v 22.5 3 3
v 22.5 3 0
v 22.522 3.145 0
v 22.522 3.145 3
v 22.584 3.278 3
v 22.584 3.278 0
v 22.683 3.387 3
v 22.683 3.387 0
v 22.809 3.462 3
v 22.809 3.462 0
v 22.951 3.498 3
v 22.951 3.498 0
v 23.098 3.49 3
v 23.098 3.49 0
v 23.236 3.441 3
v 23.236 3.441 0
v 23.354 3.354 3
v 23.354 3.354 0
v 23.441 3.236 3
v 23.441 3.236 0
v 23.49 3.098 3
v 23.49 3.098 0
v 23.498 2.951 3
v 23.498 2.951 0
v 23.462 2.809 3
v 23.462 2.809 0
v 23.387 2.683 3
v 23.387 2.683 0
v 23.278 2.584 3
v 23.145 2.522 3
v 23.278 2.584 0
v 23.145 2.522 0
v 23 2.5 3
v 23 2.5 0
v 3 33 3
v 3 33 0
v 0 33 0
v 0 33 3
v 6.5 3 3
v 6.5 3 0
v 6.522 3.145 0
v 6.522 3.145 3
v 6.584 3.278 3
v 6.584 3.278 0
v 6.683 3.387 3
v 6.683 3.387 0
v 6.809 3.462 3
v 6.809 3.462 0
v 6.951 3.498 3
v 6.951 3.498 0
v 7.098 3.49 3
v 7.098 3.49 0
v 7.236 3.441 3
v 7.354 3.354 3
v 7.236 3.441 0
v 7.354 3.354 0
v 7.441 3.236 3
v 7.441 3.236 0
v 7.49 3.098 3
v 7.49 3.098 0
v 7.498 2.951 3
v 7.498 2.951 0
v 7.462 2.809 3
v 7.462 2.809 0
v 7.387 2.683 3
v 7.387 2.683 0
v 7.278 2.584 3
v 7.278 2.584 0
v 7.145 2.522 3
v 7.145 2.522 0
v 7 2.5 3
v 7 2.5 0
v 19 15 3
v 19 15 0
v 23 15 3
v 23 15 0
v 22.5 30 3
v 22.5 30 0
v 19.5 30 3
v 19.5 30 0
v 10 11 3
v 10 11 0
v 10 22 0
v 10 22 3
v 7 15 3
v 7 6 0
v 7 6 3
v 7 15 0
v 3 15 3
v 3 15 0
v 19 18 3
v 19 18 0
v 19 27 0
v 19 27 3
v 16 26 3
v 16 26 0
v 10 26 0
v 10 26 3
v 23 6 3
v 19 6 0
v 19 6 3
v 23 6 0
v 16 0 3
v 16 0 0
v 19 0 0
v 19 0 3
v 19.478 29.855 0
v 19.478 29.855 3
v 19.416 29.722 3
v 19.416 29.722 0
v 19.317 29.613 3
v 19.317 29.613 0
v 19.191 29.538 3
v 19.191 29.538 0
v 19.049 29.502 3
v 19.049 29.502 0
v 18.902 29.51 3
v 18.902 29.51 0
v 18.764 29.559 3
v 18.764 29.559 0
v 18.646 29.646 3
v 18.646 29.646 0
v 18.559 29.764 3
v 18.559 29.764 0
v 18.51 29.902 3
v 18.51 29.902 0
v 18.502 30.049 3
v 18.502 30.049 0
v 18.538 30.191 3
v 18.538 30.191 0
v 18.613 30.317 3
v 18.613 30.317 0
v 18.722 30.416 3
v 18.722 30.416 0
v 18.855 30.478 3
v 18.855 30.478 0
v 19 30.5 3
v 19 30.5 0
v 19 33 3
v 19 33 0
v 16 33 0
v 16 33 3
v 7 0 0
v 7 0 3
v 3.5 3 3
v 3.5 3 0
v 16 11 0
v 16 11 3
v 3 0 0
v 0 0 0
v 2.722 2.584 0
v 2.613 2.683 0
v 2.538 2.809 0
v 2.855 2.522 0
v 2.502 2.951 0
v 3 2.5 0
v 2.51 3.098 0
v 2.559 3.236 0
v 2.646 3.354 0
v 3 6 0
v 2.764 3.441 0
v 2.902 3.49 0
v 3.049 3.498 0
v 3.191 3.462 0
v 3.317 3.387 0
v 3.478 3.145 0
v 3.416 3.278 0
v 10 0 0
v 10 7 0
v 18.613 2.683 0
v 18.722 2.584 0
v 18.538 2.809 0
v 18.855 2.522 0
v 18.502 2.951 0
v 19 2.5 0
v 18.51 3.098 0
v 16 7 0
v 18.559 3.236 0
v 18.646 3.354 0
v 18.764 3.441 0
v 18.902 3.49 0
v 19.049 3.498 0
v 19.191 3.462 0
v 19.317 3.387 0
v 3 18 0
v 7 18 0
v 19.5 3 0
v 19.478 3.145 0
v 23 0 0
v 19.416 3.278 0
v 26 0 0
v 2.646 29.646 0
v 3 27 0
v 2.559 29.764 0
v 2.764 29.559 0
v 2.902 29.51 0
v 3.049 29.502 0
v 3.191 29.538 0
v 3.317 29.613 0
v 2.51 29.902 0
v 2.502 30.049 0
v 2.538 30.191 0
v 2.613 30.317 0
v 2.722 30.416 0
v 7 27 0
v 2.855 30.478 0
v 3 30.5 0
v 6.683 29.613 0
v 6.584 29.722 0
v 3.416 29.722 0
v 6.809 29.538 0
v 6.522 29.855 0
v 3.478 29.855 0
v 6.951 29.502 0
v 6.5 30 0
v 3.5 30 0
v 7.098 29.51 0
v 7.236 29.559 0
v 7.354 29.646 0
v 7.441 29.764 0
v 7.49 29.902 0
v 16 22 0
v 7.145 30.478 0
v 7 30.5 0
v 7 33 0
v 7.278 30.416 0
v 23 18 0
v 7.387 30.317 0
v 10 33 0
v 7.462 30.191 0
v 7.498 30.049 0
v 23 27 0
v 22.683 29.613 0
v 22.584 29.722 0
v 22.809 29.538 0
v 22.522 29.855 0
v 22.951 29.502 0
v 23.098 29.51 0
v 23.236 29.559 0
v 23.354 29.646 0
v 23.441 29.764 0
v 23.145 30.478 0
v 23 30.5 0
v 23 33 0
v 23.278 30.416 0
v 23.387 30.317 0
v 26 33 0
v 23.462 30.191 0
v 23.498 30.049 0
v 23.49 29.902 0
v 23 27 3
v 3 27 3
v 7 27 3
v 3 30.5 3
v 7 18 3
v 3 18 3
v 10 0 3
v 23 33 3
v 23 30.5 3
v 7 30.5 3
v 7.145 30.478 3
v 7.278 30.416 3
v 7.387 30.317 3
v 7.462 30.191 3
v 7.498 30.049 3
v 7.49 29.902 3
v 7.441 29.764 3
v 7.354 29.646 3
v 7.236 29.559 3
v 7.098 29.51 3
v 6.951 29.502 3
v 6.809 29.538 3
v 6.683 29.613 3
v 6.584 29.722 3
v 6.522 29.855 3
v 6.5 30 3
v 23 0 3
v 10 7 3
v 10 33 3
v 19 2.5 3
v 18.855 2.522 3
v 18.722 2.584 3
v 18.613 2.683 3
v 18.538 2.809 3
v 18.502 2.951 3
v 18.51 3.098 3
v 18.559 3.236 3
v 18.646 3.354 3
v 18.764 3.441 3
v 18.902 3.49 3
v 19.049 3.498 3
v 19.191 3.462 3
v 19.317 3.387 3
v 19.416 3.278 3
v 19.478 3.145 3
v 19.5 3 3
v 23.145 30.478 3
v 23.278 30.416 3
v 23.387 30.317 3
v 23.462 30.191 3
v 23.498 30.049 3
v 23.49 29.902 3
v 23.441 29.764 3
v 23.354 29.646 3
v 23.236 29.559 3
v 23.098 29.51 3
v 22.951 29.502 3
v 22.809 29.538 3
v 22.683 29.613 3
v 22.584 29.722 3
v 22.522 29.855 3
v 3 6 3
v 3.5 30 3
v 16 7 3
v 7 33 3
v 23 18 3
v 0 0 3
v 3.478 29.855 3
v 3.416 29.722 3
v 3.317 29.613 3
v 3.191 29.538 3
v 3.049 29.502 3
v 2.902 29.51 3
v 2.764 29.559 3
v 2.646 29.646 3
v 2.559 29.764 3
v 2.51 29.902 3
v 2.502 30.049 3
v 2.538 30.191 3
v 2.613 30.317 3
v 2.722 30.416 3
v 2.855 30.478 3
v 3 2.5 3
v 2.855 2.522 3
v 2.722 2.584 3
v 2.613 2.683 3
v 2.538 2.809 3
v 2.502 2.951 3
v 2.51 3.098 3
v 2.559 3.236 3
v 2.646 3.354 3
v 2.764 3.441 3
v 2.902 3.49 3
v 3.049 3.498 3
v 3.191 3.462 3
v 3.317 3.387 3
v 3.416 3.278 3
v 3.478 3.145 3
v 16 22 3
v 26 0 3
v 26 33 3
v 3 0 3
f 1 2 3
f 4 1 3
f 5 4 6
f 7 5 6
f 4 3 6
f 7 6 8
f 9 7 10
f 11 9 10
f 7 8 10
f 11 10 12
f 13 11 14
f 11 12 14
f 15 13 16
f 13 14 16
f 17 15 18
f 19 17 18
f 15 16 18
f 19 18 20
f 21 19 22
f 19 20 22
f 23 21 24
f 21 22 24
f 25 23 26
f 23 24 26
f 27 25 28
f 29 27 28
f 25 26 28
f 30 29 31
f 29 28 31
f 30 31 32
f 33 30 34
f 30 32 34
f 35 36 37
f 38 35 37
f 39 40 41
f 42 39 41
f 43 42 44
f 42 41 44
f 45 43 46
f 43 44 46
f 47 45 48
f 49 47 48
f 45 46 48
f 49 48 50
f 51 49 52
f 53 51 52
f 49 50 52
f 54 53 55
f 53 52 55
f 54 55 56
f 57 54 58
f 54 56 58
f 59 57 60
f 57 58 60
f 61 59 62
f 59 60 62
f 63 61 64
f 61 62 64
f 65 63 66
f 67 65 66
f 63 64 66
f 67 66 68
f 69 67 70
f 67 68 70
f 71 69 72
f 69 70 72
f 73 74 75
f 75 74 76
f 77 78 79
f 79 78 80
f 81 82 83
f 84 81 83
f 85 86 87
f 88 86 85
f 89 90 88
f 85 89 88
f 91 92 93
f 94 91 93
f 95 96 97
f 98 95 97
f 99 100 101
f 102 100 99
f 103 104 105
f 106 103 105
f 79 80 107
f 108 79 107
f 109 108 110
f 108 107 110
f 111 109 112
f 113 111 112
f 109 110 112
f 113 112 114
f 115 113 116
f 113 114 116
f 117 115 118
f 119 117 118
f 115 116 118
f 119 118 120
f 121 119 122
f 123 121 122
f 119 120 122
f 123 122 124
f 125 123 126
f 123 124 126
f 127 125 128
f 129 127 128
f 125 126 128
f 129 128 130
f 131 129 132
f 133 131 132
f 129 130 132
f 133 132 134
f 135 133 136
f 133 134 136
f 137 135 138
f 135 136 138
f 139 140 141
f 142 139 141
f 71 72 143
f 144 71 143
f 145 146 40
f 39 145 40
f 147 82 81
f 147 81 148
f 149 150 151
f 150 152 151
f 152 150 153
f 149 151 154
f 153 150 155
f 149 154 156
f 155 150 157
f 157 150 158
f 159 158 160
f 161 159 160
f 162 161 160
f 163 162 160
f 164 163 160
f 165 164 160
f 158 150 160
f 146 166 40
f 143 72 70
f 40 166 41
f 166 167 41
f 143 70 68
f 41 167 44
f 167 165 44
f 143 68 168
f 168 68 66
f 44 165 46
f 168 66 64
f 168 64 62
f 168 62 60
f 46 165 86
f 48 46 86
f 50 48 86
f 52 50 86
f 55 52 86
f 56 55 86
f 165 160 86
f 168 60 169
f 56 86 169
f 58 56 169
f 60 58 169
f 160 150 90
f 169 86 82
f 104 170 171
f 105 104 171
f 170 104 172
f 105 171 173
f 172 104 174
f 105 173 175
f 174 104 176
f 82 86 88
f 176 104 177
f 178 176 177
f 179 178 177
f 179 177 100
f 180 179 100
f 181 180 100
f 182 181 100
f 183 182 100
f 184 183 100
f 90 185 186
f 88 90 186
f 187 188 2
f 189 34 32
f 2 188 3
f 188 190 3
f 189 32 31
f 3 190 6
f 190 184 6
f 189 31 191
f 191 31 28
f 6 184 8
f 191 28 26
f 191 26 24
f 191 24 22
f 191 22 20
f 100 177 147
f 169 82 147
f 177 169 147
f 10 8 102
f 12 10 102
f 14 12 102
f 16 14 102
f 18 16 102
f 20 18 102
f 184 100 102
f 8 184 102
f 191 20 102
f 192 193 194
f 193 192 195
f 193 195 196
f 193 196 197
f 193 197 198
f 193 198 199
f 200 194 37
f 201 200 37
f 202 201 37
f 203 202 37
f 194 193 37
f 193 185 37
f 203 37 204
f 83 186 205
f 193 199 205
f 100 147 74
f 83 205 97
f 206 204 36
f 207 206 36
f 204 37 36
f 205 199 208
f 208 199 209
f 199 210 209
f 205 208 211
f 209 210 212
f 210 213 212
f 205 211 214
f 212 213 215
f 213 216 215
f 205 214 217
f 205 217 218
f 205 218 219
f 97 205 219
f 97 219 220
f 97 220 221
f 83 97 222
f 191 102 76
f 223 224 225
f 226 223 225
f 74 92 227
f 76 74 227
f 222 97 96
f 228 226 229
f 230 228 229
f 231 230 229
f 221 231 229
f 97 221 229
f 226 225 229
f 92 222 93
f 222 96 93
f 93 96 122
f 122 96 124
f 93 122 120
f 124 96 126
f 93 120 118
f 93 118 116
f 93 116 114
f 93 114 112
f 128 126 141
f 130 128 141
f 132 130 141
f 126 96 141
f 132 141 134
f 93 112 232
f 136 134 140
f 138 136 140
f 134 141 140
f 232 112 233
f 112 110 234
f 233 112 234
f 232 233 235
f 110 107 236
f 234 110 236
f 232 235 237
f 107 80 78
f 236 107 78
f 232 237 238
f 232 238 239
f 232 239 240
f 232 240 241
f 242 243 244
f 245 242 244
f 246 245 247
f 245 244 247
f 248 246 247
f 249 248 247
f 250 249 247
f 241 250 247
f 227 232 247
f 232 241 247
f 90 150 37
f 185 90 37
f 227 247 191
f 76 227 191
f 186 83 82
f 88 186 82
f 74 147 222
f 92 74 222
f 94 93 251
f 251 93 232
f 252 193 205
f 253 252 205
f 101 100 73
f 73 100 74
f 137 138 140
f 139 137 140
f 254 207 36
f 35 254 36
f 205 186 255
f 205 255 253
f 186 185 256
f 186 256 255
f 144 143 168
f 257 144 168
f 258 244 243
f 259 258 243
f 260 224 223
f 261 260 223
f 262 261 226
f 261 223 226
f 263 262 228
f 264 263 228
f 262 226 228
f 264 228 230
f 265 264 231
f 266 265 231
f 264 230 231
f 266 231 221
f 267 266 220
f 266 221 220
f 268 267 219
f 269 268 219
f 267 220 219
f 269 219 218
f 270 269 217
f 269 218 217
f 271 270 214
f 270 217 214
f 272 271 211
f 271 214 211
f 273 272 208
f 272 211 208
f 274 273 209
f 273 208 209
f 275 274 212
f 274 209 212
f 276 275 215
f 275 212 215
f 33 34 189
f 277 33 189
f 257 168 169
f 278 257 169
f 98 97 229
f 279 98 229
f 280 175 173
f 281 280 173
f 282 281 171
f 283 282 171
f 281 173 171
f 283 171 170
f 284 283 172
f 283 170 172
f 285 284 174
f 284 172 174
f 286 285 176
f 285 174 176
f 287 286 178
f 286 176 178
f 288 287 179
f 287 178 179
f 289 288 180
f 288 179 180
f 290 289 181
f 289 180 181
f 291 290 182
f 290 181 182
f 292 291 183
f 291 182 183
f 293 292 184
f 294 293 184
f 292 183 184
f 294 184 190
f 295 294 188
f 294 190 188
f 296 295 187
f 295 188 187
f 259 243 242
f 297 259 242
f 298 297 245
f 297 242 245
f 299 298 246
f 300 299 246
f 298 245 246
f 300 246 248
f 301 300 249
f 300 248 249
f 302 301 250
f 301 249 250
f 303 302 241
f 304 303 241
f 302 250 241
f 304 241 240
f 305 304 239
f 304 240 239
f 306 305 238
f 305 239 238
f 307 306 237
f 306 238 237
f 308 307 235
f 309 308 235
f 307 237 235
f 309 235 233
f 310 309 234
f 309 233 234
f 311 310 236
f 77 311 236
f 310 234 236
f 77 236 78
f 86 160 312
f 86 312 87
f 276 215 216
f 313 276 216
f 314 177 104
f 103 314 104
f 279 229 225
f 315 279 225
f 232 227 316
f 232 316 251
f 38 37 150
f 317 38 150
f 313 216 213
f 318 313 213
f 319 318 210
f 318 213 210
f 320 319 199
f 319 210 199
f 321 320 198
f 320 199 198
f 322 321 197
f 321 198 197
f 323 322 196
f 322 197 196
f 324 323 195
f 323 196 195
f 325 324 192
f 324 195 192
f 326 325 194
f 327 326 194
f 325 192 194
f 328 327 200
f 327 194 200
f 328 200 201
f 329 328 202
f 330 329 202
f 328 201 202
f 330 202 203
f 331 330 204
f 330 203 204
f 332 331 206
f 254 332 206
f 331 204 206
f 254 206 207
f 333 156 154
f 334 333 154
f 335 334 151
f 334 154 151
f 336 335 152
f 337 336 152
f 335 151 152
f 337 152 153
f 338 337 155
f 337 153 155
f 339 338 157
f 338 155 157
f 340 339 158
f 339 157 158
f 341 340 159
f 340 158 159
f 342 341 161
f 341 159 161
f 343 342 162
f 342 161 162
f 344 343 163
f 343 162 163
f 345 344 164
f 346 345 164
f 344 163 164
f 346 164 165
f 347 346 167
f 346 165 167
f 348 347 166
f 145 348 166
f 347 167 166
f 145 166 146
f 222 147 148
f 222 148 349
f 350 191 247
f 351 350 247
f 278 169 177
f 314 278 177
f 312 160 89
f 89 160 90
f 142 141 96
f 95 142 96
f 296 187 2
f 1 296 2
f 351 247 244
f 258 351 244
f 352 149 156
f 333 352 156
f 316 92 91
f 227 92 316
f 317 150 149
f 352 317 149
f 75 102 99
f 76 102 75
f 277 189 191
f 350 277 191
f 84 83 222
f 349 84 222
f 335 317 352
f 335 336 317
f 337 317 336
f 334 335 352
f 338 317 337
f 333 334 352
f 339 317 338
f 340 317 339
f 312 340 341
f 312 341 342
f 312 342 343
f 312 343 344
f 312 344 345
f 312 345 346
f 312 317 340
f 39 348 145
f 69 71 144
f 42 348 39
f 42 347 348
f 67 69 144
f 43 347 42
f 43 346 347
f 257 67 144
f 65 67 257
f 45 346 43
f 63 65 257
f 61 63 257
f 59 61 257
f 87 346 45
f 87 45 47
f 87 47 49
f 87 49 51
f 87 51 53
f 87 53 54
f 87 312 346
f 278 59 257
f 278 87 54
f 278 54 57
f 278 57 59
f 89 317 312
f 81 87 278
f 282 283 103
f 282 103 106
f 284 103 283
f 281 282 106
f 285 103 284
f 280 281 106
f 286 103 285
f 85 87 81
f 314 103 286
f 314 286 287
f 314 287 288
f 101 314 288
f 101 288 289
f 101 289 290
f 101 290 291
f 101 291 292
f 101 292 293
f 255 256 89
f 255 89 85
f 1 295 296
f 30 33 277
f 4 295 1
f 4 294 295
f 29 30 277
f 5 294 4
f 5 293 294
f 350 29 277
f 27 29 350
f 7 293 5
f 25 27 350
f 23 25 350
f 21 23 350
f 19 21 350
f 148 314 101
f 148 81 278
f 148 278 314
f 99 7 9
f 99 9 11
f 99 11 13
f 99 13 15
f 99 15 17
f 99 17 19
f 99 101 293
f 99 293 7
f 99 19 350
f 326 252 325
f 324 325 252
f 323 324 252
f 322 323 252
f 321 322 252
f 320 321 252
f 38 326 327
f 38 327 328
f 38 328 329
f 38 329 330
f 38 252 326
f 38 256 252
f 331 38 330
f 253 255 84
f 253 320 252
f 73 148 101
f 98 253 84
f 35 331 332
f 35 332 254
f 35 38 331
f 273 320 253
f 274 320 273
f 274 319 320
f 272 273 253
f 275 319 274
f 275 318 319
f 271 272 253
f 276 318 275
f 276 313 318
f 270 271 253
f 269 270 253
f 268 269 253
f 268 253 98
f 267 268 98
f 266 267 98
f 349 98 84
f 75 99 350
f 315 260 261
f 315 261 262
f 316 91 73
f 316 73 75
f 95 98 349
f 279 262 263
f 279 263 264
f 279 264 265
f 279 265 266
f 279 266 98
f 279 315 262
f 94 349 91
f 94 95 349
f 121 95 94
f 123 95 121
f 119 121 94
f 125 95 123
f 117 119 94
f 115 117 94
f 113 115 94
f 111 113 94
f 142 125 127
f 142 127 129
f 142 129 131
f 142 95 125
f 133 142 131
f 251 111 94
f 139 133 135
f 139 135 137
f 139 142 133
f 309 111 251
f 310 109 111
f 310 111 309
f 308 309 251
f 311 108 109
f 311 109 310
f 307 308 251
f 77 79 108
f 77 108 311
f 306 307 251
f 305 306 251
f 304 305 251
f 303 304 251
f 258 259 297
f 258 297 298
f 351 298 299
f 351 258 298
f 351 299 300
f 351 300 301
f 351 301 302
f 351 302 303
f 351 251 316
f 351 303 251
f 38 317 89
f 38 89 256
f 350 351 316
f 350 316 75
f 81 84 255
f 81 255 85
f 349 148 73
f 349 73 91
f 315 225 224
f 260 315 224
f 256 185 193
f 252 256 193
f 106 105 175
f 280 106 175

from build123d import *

# Parameters (mm, degrees)
SKETCH_1_W      = 5.999999173
SKETCH_1_H      = 10.999998182
SKETCH_1_W_2    = 4.00000019
SKETCH_1_H_2    = 8.999999777
SKETCH_1_H_3    = 9.000000708
SKETCH_1_W_3    = 4.000000656
EXTRUDE_1_DEPTH = 3


with BuildPart() as part:
    # 草图1 → 凸台-拉伸1 (new body)
    with BuildSketch(Plane.XY):
        with BuildLine():
            Line((9.999999777, 25.999999166), (9.999999777, 33.000000149))
            Line((9.999999777, 33.000000149), (7.000000216, 33.000000149))
            Line((7.000000216, 33.000000149), (7.000000216, 30.499998808))
            ThreePointArc((7.000000216, 30.499998808), (7.353551416, 29.64644555), (6.500000134, 30.00000152))
            Line((6.500000134, 30.00000152), (3.500000108, 30.00000152))
            ThreePointArc((3.500000108, 30.00000152), (2.646448658, 29.646445383), (3.000000026, 30.499998808))
            Line((3.000000026, 30.499998808), (3.000000026, 33.000000149))
            Line((3.000000026, 33.000000149), (0, 33.000000149))
            Line((0, 33.000000149), (0, 0))
            Line((0, 0), (3.000000026, 0))
            Line((3.000000026, 0), (3.000000026, 2.499999944))
            ThreePointArc((3.000000026, 2.499999944), (2.64644665, 3.353553403), (3.500000108, 3.000000026))
            Line((3.500000108, 3.000000026), (6.500000134, 3.000000026))
            ThreePointArc((6.500000134, 3.000000026), (7.353553425, 3.353553235), (7.000000216, 2.499999944))
            Line((7.000000216, 2.499999944), (7.000000216, 0))
            Line((7.000000216, 0), (9.999999777, 0))
            Line((9.999999777, 0), (9.999999777, 7.000000983))
            Line((9.999999777, 7.000000983), (16.00000076, 7.000000983))
            Line((16.00000076, 7.000000983), (16.00000076, 0))
            Line((16.00000076, 0), (18.999999389, 0))
            Line((18.999999389, 0), (18.999999389, 2.499999944))
            ThreePointArc((18.999999389, 2.499999944), (18.646447034, 3.353553971), (19.500000402, 3.000000026))
            Line((19.500000402, 3.000000026), (22.500000894, 3.000000026))
            ThreePointArc((22.500000894, 3.000000026), (23.353554637, 3.353553028), (23.000000045, 2.499999944))
            Line((23.000000045, 2.499999944), (23.000000045, 0))
            Line((23.000000045, 0), (26.000000536, 0))
            Line((26.000000536, 0), (26.000000536, 33.000000149))
            Line((26.000000536, 33.000000149), (23.000000045, 33.000000149))
            Line((23.000000045, 33.000000149), (23.000000045, 30.499998808))
            ThreePointArc((23.000000045, 30.499998808), (23.353552628, 29.646445757), (22.500000894, 30.00000152))
            Line((22.500000894, 30.00000152), (19.500000402, 30.00000152))
            ThreePointArc((19.500000402, 30.00000152), (18.646449043, 29.646444814), (18.999999389, 30.499998808))
            Line((18.999999389, 30.499998808), (18.999999389, 33.000000149))
            Line((18.999999389, 33.000000149), (16.00000076, 33.000000149))
            Line((16.00000076, 33.000000149), (16.00000076, 25.999999166))
            Line((16.00000076, 25.999999166), (9.999999777, 25.999999166))
        make_face()
        with Locations((12.999999802, 16.500000075)):
            Rectangle(SKETCH_1_W, SKETCH_1_H, mode=Mode.SUBTRACT)
        with Locations((5.000000121, 22.499999278)):
            Rectangle(SKETCH_1_W_2, SKETCH_1_H_2, mode=Mode.SUBTRACT)
        with Locations((5.000000121, 10.500000406)):
            Rectangle(SKETCH_1_W_2, SKETCH_1_H_3, mode=Mode.SUBTRACT)
        with Locations((20.999999717, 10.500000406)):
            Rectangle(SKETCH_1_W_3, SKETCH_1_H_3, mode=Mode.SUBTRACT)
        with Locations((20.999999717, 22.499999278)):
            Rectangle(SKETCH_1_W_3, SKETCH_1_H_2, mode=Mode.SUBTRACT)
    extrude(amount=EXTRUDE_1_DEPTH)


solid = part.part
